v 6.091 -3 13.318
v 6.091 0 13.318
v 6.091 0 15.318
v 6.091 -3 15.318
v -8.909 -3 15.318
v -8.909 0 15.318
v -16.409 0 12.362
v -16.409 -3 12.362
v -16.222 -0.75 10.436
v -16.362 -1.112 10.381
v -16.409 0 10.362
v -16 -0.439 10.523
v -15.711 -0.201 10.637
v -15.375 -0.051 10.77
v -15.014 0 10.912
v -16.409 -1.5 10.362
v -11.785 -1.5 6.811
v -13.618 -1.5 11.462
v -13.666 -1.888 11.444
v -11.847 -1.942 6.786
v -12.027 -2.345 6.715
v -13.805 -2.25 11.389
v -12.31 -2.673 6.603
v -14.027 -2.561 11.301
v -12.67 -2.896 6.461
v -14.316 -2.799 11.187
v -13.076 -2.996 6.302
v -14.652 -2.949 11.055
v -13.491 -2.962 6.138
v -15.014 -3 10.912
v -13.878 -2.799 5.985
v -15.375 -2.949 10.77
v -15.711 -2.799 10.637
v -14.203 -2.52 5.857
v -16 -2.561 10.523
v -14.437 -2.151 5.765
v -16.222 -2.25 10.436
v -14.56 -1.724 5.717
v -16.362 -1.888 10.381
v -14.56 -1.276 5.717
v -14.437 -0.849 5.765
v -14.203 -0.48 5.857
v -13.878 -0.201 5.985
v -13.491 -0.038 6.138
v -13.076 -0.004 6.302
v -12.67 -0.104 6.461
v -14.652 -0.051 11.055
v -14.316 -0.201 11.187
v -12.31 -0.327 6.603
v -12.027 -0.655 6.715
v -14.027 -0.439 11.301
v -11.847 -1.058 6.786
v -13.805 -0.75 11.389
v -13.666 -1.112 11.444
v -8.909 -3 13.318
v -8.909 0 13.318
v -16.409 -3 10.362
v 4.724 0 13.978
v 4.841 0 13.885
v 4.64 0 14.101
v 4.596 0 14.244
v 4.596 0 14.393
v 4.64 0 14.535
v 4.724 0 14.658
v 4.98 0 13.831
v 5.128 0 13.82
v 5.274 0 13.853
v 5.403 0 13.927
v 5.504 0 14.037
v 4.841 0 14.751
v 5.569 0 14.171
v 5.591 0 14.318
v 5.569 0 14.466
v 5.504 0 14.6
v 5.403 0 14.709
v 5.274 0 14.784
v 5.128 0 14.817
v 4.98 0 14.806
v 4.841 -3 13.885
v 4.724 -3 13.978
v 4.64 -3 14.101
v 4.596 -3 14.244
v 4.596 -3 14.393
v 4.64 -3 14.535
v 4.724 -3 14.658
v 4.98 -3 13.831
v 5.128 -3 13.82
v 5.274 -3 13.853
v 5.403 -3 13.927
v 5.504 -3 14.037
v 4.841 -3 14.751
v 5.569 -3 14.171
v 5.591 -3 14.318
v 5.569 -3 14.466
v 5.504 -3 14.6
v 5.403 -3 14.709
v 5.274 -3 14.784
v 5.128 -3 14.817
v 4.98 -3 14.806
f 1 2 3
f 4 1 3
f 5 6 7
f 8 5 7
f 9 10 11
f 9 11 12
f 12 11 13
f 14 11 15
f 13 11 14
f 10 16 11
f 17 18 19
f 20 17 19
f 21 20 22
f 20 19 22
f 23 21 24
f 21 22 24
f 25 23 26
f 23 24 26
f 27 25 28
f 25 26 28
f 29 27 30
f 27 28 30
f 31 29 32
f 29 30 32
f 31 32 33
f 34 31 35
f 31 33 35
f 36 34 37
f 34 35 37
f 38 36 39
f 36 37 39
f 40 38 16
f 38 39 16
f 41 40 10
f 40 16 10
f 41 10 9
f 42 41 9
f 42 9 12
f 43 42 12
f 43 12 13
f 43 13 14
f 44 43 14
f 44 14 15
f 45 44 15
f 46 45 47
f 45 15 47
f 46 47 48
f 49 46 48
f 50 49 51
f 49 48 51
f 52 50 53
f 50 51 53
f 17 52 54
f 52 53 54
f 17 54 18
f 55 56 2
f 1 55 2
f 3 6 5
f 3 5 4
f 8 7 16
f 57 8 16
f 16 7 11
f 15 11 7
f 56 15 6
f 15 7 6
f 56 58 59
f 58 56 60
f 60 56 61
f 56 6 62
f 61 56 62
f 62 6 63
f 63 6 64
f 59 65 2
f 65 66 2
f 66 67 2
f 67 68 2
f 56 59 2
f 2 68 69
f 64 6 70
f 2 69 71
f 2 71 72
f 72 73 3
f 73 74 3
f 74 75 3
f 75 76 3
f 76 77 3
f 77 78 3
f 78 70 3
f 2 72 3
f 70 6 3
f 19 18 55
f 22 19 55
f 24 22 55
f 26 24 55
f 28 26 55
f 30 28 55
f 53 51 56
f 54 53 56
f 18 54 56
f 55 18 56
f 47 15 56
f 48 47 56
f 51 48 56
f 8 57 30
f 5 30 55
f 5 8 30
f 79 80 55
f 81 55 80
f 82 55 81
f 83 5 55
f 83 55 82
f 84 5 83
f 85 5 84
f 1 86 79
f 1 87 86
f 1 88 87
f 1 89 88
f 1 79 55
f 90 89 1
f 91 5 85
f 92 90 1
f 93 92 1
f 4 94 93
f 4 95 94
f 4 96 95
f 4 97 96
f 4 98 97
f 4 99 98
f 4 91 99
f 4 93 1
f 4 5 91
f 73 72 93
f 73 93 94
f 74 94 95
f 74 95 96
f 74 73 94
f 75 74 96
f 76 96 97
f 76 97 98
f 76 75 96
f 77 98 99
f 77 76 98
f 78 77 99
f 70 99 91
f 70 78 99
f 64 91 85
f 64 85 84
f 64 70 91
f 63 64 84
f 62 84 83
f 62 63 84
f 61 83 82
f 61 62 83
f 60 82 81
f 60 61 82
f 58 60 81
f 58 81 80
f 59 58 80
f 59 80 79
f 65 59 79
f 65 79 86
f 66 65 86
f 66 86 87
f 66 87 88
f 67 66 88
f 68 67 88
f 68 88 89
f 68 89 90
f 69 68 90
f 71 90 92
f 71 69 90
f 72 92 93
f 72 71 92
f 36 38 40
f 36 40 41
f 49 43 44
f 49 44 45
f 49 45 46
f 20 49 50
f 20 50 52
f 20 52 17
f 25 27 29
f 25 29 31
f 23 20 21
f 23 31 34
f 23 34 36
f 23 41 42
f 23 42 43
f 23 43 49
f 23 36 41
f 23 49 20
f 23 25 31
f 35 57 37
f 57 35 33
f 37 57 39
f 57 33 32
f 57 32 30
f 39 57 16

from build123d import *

# Parameters (mm, degrees)
F0_W     = 15
F0_H     = 2
F0_R     = 0.5
F1_DEPTH = 3
F2_R     = 1.5
F3_DEPTH = 5


with BuildPart() as f1:
    # F0 (on Front) → F1 (new body)
    with BuildSketch(Plane.XZ):
        with Locations((-1.4090953767, 14.3183305617)):
            Rectangle(F0_W, F0_H)
        with Locations((5.0909046233, 14.3183305617)):
            Circle(F0_R, mode=Mode.SUBTRACT)
        Polygon((-8.9090953767, 13.3183305617), (-8.9090953767, 15.3183305617), (-16.4090953767, 12.3621613234), (-16.4090953767, 10.3621613234), align=None)
    extrude(amount=F1_DEPTH)

    # F2 (on face) → F3 (join)
    with BuildSketch(Plane(origin=(-5.7415974535, 0, 14.5668185514), x_dir=(0.9303396878, 0, 0.3666988755), z_dir=(0.3666988755, 0, -0.9303396878))):
        with Locations((-9.9662397649, 1.5)):
            Circle(F2_R)
    extrude(amount=F3_DEPTH)


solid = f1.part
